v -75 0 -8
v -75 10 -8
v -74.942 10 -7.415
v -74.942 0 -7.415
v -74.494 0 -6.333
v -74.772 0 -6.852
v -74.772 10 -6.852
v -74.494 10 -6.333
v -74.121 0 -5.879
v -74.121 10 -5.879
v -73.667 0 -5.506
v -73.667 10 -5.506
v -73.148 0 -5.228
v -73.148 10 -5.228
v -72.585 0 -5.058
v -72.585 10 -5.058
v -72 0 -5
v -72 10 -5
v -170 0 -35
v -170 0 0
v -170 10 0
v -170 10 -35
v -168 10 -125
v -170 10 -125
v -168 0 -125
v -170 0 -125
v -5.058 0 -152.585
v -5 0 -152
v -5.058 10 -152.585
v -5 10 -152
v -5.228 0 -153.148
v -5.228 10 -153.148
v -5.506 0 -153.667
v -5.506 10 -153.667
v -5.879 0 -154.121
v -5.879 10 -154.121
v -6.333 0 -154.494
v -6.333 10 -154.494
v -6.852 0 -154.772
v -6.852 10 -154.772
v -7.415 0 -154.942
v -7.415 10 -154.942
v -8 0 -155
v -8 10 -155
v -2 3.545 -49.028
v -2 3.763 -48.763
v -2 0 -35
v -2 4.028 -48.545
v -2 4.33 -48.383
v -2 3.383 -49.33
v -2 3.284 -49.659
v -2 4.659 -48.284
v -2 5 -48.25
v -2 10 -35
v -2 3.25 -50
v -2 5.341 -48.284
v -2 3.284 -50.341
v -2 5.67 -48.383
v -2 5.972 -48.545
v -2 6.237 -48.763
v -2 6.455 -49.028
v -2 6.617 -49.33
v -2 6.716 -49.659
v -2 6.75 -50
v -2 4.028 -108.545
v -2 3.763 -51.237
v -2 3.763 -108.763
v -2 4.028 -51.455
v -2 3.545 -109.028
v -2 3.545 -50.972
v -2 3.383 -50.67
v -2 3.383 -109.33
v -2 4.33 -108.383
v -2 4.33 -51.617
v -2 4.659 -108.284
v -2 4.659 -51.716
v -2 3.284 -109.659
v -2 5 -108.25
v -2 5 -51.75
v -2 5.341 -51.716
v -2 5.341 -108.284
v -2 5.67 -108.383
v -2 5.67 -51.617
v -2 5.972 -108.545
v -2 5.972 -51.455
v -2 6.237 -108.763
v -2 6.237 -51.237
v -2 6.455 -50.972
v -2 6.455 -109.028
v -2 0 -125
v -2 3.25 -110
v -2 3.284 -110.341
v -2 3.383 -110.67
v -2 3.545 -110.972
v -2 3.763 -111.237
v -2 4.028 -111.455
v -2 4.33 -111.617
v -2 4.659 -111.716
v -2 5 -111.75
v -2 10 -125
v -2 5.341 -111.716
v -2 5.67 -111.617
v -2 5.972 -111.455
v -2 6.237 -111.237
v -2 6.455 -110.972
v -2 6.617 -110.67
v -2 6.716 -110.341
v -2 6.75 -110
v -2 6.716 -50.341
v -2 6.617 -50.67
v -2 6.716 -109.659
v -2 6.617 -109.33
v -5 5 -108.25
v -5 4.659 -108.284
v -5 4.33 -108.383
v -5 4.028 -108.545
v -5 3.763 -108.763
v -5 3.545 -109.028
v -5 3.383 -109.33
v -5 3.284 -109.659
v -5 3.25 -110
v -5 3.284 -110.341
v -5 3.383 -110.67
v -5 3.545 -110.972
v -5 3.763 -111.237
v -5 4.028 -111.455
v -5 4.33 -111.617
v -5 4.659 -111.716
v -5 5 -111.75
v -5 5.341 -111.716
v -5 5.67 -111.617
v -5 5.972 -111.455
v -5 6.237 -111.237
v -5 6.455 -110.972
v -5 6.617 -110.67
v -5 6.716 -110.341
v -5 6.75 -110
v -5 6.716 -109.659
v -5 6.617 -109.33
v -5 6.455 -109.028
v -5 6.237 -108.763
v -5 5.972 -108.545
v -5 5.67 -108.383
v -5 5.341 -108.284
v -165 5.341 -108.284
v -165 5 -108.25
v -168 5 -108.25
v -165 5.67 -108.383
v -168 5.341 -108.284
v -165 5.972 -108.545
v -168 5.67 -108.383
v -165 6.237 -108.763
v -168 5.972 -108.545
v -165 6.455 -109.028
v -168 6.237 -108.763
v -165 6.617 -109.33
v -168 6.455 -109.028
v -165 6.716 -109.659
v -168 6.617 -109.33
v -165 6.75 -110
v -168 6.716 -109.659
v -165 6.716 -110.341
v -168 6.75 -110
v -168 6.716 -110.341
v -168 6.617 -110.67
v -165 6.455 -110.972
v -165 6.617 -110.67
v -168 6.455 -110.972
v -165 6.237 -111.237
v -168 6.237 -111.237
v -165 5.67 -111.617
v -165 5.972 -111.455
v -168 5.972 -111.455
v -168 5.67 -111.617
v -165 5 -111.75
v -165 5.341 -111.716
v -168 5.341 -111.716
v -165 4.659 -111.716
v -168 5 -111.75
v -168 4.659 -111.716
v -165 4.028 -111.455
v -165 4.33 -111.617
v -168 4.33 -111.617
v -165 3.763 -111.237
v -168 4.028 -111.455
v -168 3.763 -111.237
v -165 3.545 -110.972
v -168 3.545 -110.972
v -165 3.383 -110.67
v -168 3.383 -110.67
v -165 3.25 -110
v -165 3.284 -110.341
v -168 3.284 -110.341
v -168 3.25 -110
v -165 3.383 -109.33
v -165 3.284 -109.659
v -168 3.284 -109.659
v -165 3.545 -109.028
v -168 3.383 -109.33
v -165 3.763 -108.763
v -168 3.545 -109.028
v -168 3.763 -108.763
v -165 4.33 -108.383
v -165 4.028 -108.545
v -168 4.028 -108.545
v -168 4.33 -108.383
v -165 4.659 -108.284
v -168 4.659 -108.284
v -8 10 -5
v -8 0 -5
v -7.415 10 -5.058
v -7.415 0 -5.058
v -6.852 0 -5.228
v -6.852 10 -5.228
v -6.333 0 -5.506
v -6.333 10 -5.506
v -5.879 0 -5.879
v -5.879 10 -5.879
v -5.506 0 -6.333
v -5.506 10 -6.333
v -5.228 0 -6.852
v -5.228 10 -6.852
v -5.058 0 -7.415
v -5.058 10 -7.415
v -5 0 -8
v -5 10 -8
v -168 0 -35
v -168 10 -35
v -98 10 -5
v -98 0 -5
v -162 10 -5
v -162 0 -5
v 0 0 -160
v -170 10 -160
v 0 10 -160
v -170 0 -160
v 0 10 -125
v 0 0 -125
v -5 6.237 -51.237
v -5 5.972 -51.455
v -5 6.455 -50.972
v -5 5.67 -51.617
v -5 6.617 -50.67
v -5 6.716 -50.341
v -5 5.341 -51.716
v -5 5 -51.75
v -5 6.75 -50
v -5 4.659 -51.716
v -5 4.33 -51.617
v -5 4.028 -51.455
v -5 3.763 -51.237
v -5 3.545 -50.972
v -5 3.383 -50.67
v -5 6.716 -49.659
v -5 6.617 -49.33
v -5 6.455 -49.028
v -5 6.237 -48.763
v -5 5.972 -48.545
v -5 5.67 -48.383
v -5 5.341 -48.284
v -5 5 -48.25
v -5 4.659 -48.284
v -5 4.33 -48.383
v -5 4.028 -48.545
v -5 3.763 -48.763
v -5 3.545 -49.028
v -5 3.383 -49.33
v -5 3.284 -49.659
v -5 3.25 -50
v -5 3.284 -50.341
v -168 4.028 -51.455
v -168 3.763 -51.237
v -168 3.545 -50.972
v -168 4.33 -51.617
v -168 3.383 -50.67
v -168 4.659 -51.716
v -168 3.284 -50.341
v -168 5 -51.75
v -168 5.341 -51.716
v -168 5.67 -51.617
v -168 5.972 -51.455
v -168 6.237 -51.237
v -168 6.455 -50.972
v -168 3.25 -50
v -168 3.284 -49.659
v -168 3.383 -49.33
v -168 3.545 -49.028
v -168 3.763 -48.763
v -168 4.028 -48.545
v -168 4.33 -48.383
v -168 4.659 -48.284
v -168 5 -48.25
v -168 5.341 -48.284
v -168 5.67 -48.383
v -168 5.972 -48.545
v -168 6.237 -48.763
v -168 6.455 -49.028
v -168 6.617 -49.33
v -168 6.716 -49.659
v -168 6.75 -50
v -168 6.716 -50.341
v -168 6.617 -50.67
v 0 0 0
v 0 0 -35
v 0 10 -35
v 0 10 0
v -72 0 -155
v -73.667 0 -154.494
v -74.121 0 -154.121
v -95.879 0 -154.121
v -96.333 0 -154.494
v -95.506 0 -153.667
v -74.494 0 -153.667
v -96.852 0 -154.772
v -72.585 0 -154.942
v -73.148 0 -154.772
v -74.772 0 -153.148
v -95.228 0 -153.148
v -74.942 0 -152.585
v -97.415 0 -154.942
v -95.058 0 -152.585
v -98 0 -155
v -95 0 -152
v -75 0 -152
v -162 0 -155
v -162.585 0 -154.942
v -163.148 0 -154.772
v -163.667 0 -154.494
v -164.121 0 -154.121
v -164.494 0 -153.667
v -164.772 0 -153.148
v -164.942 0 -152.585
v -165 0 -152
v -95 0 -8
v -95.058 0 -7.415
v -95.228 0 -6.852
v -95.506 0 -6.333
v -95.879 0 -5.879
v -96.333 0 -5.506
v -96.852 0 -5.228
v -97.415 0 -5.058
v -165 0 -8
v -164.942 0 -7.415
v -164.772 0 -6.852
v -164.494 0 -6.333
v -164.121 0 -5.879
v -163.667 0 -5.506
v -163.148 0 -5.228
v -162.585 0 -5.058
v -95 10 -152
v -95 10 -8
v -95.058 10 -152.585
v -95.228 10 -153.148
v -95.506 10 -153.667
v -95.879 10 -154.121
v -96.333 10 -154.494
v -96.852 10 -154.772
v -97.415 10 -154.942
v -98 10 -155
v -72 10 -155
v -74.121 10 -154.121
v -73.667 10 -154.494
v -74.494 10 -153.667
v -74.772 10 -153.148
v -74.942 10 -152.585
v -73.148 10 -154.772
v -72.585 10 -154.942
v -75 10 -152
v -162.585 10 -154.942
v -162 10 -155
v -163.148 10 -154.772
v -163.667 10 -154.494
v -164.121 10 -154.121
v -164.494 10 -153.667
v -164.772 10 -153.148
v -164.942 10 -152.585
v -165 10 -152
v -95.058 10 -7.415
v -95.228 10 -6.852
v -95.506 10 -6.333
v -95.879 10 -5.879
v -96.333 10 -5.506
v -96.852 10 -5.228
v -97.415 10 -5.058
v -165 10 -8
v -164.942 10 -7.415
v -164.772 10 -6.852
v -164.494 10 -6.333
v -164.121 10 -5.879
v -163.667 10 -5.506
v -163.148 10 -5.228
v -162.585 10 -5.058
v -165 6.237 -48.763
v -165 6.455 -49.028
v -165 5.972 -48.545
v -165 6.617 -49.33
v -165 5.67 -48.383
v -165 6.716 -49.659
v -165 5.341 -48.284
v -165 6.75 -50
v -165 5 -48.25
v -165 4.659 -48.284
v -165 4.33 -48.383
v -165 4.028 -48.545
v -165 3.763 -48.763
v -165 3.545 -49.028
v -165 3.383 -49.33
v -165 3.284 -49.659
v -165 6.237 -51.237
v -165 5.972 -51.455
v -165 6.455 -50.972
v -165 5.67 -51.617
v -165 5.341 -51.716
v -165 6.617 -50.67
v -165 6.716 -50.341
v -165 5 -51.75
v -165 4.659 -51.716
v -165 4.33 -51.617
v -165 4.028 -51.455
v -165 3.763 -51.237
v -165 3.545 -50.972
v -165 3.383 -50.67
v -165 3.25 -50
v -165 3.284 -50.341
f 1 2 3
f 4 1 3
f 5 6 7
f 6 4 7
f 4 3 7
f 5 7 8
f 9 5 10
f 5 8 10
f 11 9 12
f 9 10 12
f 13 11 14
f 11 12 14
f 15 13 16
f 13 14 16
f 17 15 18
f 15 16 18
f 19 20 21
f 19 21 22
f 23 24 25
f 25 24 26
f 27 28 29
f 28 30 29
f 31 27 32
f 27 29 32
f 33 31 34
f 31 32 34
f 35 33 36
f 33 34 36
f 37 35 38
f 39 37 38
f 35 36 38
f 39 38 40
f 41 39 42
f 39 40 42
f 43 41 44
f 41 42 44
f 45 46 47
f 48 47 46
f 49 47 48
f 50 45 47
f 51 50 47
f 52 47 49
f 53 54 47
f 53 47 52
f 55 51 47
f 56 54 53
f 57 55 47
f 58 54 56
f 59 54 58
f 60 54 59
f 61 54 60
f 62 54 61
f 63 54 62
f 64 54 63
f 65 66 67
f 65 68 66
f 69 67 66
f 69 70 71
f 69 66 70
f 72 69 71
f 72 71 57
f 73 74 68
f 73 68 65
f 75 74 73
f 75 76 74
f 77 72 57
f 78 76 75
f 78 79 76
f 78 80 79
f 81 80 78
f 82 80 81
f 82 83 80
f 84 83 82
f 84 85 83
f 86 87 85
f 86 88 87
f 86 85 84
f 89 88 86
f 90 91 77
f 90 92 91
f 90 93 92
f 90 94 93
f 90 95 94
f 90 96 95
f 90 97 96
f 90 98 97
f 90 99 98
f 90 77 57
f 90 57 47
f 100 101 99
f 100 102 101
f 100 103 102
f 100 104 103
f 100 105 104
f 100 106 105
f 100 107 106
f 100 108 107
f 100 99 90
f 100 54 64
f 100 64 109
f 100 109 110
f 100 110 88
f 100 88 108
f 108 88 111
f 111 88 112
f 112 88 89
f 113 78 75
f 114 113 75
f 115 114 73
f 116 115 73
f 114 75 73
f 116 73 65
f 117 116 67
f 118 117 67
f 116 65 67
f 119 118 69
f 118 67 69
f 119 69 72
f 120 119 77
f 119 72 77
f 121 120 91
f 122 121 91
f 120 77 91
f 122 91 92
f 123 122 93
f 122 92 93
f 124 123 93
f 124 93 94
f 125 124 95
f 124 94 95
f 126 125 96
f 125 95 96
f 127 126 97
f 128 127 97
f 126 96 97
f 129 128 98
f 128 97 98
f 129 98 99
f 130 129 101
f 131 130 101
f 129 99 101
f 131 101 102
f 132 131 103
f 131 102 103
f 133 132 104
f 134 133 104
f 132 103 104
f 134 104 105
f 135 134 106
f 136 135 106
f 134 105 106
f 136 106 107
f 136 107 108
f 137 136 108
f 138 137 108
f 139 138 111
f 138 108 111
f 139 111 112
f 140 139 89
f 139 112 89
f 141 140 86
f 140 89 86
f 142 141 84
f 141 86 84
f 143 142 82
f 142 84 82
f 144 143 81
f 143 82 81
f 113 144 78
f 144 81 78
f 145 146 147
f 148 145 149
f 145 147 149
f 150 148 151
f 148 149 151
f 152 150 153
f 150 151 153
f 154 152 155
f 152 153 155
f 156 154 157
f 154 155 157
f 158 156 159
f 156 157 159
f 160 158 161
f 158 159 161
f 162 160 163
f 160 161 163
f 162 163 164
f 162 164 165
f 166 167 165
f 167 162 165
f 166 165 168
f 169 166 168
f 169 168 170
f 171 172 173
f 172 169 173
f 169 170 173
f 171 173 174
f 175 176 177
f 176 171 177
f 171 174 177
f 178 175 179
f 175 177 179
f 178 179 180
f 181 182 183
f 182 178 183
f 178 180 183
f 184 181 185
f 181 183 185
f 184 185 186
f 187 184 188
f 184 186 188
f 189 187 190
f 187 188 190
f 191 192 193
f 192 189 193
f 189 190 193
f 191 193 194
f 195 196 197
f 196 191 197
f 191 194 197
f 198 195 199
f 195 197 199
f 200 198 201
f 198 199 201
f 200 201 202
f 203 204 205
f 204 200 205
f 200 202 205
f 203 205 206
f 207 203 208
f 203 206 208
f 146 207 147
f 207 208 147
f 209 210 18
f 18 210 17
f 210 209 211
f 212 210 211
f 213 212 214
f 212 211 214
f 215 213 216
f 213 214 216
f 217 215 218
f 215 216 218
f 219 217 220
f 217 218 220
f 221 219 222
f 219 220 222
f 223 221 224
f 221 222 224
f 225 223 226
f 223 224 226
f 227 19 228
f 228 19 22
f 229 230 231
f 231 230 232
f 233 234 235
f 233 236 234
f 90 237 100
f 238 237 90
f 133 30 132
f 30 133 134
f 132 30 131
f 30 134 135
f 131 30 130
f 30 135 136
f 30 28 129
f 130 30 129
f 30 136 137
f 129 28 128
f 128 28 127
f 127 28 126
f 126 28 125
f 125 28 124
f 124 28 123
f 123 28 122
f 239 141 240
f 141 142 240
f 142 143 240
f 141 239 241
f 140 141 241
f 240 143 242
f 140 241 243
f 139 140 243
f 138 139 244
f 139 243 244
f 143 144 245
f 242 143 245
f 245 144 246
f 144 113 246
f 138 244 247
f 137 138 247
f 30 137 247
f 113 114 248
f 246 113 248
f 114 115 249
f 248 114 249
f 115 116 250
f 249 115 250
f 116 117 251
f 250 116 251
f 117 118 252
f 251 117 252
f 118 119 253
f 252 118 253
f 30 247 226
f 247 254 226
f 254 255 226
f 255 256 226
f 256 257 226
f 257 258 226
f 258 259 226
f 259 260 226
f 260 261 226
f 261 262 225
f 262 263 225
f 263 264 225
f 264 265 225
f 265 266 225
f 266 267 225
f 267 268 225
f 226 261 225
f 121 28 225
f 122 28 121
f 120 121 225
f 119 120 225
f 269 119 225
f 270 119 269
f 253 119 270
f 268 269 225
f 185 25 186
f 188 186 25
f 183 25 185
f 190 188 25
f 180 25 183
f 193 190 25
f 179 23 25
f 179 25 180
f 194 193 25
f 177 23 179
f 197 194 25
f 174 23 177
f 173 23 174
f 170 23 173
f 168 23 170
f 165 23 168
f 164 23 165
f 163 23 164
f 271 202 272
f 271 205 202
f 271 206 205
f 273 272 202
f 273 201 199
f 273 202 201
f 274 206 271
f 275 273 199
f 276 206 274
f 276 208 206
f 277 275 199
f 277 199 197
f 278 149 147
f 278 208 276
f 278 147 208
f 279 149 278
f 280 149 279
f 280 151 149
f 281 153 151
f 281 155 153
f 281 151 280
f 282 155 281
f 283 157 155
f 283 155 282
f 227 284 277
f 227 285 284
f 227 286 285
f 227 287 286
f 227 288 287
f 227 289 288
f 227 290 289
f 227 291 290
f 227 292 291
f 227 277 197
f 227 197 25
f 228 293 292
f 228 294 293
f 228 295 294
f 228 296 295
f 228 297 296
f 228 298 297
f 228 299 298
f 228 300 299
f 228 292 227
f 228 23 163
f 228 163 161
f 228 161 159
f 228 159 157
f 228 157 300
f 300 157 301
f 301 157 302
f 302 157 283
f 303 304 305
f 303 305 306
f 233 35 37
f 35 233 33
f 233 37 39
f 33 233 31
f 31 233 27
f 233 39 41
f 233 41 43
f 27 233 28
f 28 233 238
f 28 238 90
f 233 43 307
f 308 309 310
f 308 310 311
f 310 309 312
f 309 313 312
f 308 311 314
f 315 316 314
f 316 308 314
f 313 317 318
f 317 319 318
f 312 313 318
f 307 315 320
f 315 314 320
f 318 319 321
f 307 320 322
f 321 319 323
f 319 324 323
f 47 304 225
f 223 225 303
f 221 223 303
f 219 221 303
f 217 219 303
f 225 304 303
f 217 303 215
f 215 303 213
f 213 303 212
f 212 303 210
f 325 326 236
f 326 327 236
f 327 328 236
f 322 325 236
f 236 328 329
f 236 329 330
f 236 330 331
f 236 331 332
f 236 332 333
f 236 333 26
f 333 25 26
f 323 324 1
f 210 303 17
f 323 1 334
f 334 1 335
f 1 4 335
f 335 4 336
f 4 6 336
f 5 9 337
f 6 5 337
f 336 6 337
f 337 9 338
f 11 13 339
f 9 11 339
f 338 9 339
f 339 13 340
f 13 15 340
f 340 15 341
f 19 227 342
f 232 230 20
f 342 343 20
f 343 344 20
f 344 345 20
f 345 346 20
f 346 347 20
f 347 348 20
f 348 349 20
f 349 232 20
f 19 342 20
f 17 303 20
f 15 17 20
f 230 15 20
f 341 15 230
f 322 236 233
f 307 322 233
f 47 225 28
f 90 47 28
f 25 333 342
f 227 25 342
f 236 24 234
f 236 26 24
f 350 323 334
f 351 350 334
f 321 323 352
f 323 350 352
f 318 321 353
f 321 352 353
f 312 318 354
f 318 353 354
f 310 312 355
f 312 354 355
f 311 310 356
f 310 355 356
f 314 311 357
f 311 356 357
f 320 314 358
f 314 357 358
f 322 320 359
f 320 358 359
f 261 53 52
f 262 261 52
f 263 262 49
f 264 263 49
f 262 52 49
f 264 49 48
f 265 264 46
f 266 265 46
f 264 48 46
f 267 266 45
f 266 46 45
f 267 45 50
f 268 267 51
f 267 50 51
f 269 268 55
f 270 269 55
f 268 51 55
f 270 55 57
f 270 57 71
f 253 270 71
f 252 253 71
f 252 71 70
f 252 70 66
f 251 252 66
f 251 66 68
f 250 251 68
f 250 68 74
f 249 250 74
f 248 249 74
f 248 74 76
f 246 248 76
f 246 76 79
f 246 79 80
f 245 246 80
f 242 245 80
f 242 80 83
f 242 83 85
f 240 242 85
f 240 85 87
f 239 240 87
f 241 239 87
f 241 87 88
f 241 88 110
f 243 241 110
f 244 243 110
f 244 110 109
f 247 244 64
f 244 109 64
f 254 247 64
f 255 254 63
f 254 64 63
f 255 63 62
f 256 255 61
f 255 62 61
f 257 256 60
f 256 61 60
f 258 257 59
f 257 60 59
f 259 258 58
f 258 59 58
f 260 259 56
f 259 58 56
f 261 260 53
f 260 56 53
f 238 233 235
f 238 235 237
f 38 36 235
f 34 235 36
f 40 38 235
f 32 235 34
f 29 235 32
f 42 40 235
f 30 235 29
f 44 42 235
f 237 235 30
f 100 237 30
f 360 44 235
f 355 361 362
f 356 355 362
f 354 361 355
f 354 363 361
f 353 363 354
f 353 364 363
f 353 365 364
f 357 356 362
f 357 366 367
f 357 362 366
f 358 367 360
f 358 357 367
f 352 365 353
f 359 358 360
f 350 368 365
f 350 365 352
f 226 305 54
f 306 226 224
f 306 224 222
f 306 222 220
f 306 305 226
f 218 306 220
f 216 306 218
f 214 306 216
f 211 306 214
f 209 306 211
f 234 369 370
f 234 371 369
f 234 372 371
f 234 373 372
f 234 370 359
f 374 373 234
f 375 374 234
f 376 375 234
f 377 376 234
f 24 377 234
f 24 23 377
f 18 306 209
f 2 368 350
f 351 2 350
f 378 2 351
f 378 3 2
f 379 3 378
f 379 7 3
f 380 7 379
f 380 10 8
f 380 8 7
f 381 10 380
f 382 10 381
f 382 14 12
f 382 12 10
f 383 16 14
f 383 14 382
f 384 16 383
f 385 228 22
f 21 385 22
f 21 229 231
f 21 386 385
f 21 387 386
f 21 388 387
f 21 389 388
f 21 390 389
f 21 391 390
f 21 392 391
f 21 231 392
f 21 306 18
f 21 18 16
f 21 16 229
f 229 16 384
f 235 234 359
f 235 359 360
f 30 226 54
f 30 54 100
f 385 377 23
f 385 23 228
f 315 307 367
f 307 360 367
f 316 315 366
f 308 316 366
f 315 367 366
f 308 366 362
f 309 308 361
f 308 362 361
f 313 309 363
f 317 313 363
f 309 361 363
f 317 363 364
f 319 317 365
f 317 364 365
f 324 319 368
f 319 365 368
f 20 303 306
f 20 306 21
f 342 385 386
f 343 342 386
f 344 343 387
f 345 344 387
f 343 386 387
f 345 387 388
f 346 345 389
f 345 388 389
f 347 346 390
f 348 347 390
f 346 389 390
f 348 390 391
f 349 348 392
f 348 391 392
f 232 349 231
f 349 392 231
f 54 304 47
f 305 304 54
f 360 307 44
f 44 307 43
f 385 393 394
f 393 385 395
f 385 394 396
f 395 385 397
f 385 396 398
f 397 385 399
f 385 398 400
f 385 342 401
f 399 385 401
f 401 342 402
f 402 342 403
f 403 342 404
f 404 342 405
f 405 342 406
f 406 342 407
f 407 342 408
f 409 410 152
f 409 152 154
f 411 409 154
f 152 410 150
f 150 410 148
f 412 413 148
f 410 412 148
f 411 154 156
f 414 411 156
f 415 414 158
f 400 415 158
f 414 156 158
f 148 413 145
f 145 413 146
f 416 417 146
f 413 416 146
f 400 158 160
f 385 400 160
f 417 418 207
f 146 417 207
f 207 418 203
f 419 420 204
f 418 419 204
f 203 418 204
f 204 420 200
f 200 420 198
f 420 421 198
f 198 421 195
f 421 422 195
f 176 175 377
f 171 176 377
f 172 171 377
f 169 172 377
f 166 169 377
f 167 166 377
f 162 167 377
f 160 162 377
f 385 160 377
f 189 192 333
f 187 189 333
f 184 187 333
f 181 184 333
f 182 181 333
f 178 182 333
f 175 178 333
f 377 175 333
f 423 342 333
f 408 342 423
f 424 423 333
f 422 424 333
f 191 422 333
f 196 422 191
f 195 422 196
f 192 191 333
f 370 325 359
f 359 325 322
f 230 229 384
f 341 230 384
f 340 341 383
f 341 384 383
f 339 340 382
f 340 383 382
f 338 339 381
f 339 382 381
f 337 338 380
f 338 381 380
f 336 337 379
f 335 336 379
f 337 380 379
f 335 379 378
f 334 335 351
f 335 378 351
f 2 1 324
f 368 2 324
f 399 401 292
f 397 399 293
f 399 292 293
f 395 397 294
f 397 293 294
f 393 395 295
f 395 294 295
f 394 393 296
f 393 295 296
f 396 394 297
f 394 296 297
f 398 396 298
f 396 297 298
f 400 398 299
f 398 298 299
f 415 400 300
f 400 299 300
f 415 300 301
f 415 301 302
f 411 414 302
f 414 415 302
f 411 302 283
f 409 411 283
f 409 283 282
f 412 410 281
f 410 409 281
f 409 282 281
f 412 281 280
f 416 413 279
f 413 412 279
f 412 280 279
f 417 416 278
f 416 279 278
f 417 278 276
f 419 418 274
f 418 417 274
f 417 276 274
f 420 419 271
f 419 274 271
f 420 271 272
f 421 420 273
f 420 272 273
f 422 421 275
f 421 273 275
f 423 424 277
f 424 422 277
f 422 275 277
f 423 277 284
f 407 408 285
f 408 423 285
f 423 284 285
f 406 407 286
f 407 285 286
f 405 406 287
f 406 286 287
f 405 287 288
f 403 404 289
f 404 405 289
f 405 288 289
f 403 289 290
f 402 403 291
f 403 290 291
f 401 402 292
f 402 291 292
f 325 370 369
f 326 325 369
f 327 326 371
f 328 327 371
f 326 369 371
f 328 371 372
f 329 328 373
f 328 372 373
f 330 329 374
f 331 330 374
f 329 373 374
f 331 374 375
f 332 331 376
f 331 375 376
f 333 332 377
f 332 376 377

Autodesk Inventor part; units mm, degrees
ref_plane "YZ Plane" through (0, 0, 0) normal (1, 0, 0) x (0, 1, 0)
ref_plane "XZ Plane" through (0, 0, 0) normal (0, 1, 0) x (-1, 0, 0)
sketch "Sketch1" plane through (0, 0, 0) normal (0, 1, 0) x (-1, 0, 0)
  line L0 (0, 0) -> (170, 0)
  line L1 (170, 0) -> (170, -160)
  line L2 (170, -160) -> (0, -160)
  line L3 (0, -160) -> (0, 0)
  line L4 (5, -5) -> (165, -5)
  line L5 (165, -5) -> (165, -155)
  line L6 (165, -155) -> (5, -155)
  line L7 (5, -155) -> (5, -5)
  line L8 (95, -5) -> (75, -5)
  line L9 (75, -5) -> (75, -155)
  line L10 (75, -155) -> (95, -155)
  line L11 (95, -155) -> (95, -5)
  point P0 (85, -5)
  point P1 (85, 0)
  point P2 (95, -155)
  point P3 (75, -5)
  dimension "d0" = 170
  dimension "d1" = 160
  dimension "d2" = 5
  dimension "d5" = 20
extrude "Extrusion1" add sketch "Sketch1" along normal blind 10 contours L0 L1 L2 L3 | L4 L11 L6 L9
fillet "Fillet1" radius 3 8 edges at (-165, 5, -5) (-95, 5, -5) (-5, 5, -5) (-5, 5, -155) (-75, 5, -155) (-95, 5, -155) (-75, 5, -5) (-165, 5, -155)
sketch "Sketch2" plane through (-5, 0, -152) normal (-1, 0, 0) x (0, 0, 1)
  line L0 (144, 10) -> (144, 0) construction
  line L1 (144, 5) -> (0, 5) construction
  line L2 (0, 0) -> (0, 10) construction
  line L3 (147, 0) -> (147, 10) construction
  line L4 (-3, 10) -> (-3, 0) construction
  point P0 (152, 0)
  point P1 (102, 5)
  point P2 (42, 5)
  point P3 (-3, 5)
  dimension "d20" = 45
  dimension "d21" = 45
hole "Hole1" at (-5, 5, -50) at (-5, 5, -110) direction (1, 0, 0) diameter 3.5 end through all
sketch "Sketch5" plane through (0, 0, 0) normal (1, 0, 0) x (0, 0, -1)
  line L0 (8, 10) -> (152, 10) projected
  line L1 (8, 0) -> (152, 0) projected
  line L2 (35, 10) -> (125, 10)
  line L3 (125, 10) -> (125, 0)
  line L4 (125, 0) -> (35, 0)
  line L5 (35, 0) -> (35, 10)
  line L6 (0, 0) -> (0, 10) projected
  point P0 (0, 5)
  dimension "d37" = 90
  dimension "d38" = 35
extrude "Extrusion5" cut sketch "Sketch5" against normal blind 2
sketch "Sketch6" plane through (-170, 0, -160) normal (-1, 0, 0) x (0, 0, 1)
  line L0 (8, 0) -> (152, 0) projected
  line L1 (125, 10) -> (35, 10) projected
  line L2 (35, 0) -> (125, 0)
  line L3 (125, 0) -> (125, 10)
  line L4 (125, 10) -> (35, 10)
  line L5 (35, 10) -> (35, 0)
  line L6 (0, 0) -> (0, 10) projected
  point P0 (160, 0)
  dimension "d41" = 90
  dimension "d42" = 35
extrude "Extrusion6" cut sketch "Sketch6" against normal blind 2
ref_plane "Work Plane2" through (-85, 0, 0) normal (1, 0, 0) x (0, 0, -1)
mirror "Mirror2" about plane through (-85, 0, 0) normal (1, 0, 0) of "Hole1"
properties part number "Mirror_shell3" material "Aluminum 6061"
